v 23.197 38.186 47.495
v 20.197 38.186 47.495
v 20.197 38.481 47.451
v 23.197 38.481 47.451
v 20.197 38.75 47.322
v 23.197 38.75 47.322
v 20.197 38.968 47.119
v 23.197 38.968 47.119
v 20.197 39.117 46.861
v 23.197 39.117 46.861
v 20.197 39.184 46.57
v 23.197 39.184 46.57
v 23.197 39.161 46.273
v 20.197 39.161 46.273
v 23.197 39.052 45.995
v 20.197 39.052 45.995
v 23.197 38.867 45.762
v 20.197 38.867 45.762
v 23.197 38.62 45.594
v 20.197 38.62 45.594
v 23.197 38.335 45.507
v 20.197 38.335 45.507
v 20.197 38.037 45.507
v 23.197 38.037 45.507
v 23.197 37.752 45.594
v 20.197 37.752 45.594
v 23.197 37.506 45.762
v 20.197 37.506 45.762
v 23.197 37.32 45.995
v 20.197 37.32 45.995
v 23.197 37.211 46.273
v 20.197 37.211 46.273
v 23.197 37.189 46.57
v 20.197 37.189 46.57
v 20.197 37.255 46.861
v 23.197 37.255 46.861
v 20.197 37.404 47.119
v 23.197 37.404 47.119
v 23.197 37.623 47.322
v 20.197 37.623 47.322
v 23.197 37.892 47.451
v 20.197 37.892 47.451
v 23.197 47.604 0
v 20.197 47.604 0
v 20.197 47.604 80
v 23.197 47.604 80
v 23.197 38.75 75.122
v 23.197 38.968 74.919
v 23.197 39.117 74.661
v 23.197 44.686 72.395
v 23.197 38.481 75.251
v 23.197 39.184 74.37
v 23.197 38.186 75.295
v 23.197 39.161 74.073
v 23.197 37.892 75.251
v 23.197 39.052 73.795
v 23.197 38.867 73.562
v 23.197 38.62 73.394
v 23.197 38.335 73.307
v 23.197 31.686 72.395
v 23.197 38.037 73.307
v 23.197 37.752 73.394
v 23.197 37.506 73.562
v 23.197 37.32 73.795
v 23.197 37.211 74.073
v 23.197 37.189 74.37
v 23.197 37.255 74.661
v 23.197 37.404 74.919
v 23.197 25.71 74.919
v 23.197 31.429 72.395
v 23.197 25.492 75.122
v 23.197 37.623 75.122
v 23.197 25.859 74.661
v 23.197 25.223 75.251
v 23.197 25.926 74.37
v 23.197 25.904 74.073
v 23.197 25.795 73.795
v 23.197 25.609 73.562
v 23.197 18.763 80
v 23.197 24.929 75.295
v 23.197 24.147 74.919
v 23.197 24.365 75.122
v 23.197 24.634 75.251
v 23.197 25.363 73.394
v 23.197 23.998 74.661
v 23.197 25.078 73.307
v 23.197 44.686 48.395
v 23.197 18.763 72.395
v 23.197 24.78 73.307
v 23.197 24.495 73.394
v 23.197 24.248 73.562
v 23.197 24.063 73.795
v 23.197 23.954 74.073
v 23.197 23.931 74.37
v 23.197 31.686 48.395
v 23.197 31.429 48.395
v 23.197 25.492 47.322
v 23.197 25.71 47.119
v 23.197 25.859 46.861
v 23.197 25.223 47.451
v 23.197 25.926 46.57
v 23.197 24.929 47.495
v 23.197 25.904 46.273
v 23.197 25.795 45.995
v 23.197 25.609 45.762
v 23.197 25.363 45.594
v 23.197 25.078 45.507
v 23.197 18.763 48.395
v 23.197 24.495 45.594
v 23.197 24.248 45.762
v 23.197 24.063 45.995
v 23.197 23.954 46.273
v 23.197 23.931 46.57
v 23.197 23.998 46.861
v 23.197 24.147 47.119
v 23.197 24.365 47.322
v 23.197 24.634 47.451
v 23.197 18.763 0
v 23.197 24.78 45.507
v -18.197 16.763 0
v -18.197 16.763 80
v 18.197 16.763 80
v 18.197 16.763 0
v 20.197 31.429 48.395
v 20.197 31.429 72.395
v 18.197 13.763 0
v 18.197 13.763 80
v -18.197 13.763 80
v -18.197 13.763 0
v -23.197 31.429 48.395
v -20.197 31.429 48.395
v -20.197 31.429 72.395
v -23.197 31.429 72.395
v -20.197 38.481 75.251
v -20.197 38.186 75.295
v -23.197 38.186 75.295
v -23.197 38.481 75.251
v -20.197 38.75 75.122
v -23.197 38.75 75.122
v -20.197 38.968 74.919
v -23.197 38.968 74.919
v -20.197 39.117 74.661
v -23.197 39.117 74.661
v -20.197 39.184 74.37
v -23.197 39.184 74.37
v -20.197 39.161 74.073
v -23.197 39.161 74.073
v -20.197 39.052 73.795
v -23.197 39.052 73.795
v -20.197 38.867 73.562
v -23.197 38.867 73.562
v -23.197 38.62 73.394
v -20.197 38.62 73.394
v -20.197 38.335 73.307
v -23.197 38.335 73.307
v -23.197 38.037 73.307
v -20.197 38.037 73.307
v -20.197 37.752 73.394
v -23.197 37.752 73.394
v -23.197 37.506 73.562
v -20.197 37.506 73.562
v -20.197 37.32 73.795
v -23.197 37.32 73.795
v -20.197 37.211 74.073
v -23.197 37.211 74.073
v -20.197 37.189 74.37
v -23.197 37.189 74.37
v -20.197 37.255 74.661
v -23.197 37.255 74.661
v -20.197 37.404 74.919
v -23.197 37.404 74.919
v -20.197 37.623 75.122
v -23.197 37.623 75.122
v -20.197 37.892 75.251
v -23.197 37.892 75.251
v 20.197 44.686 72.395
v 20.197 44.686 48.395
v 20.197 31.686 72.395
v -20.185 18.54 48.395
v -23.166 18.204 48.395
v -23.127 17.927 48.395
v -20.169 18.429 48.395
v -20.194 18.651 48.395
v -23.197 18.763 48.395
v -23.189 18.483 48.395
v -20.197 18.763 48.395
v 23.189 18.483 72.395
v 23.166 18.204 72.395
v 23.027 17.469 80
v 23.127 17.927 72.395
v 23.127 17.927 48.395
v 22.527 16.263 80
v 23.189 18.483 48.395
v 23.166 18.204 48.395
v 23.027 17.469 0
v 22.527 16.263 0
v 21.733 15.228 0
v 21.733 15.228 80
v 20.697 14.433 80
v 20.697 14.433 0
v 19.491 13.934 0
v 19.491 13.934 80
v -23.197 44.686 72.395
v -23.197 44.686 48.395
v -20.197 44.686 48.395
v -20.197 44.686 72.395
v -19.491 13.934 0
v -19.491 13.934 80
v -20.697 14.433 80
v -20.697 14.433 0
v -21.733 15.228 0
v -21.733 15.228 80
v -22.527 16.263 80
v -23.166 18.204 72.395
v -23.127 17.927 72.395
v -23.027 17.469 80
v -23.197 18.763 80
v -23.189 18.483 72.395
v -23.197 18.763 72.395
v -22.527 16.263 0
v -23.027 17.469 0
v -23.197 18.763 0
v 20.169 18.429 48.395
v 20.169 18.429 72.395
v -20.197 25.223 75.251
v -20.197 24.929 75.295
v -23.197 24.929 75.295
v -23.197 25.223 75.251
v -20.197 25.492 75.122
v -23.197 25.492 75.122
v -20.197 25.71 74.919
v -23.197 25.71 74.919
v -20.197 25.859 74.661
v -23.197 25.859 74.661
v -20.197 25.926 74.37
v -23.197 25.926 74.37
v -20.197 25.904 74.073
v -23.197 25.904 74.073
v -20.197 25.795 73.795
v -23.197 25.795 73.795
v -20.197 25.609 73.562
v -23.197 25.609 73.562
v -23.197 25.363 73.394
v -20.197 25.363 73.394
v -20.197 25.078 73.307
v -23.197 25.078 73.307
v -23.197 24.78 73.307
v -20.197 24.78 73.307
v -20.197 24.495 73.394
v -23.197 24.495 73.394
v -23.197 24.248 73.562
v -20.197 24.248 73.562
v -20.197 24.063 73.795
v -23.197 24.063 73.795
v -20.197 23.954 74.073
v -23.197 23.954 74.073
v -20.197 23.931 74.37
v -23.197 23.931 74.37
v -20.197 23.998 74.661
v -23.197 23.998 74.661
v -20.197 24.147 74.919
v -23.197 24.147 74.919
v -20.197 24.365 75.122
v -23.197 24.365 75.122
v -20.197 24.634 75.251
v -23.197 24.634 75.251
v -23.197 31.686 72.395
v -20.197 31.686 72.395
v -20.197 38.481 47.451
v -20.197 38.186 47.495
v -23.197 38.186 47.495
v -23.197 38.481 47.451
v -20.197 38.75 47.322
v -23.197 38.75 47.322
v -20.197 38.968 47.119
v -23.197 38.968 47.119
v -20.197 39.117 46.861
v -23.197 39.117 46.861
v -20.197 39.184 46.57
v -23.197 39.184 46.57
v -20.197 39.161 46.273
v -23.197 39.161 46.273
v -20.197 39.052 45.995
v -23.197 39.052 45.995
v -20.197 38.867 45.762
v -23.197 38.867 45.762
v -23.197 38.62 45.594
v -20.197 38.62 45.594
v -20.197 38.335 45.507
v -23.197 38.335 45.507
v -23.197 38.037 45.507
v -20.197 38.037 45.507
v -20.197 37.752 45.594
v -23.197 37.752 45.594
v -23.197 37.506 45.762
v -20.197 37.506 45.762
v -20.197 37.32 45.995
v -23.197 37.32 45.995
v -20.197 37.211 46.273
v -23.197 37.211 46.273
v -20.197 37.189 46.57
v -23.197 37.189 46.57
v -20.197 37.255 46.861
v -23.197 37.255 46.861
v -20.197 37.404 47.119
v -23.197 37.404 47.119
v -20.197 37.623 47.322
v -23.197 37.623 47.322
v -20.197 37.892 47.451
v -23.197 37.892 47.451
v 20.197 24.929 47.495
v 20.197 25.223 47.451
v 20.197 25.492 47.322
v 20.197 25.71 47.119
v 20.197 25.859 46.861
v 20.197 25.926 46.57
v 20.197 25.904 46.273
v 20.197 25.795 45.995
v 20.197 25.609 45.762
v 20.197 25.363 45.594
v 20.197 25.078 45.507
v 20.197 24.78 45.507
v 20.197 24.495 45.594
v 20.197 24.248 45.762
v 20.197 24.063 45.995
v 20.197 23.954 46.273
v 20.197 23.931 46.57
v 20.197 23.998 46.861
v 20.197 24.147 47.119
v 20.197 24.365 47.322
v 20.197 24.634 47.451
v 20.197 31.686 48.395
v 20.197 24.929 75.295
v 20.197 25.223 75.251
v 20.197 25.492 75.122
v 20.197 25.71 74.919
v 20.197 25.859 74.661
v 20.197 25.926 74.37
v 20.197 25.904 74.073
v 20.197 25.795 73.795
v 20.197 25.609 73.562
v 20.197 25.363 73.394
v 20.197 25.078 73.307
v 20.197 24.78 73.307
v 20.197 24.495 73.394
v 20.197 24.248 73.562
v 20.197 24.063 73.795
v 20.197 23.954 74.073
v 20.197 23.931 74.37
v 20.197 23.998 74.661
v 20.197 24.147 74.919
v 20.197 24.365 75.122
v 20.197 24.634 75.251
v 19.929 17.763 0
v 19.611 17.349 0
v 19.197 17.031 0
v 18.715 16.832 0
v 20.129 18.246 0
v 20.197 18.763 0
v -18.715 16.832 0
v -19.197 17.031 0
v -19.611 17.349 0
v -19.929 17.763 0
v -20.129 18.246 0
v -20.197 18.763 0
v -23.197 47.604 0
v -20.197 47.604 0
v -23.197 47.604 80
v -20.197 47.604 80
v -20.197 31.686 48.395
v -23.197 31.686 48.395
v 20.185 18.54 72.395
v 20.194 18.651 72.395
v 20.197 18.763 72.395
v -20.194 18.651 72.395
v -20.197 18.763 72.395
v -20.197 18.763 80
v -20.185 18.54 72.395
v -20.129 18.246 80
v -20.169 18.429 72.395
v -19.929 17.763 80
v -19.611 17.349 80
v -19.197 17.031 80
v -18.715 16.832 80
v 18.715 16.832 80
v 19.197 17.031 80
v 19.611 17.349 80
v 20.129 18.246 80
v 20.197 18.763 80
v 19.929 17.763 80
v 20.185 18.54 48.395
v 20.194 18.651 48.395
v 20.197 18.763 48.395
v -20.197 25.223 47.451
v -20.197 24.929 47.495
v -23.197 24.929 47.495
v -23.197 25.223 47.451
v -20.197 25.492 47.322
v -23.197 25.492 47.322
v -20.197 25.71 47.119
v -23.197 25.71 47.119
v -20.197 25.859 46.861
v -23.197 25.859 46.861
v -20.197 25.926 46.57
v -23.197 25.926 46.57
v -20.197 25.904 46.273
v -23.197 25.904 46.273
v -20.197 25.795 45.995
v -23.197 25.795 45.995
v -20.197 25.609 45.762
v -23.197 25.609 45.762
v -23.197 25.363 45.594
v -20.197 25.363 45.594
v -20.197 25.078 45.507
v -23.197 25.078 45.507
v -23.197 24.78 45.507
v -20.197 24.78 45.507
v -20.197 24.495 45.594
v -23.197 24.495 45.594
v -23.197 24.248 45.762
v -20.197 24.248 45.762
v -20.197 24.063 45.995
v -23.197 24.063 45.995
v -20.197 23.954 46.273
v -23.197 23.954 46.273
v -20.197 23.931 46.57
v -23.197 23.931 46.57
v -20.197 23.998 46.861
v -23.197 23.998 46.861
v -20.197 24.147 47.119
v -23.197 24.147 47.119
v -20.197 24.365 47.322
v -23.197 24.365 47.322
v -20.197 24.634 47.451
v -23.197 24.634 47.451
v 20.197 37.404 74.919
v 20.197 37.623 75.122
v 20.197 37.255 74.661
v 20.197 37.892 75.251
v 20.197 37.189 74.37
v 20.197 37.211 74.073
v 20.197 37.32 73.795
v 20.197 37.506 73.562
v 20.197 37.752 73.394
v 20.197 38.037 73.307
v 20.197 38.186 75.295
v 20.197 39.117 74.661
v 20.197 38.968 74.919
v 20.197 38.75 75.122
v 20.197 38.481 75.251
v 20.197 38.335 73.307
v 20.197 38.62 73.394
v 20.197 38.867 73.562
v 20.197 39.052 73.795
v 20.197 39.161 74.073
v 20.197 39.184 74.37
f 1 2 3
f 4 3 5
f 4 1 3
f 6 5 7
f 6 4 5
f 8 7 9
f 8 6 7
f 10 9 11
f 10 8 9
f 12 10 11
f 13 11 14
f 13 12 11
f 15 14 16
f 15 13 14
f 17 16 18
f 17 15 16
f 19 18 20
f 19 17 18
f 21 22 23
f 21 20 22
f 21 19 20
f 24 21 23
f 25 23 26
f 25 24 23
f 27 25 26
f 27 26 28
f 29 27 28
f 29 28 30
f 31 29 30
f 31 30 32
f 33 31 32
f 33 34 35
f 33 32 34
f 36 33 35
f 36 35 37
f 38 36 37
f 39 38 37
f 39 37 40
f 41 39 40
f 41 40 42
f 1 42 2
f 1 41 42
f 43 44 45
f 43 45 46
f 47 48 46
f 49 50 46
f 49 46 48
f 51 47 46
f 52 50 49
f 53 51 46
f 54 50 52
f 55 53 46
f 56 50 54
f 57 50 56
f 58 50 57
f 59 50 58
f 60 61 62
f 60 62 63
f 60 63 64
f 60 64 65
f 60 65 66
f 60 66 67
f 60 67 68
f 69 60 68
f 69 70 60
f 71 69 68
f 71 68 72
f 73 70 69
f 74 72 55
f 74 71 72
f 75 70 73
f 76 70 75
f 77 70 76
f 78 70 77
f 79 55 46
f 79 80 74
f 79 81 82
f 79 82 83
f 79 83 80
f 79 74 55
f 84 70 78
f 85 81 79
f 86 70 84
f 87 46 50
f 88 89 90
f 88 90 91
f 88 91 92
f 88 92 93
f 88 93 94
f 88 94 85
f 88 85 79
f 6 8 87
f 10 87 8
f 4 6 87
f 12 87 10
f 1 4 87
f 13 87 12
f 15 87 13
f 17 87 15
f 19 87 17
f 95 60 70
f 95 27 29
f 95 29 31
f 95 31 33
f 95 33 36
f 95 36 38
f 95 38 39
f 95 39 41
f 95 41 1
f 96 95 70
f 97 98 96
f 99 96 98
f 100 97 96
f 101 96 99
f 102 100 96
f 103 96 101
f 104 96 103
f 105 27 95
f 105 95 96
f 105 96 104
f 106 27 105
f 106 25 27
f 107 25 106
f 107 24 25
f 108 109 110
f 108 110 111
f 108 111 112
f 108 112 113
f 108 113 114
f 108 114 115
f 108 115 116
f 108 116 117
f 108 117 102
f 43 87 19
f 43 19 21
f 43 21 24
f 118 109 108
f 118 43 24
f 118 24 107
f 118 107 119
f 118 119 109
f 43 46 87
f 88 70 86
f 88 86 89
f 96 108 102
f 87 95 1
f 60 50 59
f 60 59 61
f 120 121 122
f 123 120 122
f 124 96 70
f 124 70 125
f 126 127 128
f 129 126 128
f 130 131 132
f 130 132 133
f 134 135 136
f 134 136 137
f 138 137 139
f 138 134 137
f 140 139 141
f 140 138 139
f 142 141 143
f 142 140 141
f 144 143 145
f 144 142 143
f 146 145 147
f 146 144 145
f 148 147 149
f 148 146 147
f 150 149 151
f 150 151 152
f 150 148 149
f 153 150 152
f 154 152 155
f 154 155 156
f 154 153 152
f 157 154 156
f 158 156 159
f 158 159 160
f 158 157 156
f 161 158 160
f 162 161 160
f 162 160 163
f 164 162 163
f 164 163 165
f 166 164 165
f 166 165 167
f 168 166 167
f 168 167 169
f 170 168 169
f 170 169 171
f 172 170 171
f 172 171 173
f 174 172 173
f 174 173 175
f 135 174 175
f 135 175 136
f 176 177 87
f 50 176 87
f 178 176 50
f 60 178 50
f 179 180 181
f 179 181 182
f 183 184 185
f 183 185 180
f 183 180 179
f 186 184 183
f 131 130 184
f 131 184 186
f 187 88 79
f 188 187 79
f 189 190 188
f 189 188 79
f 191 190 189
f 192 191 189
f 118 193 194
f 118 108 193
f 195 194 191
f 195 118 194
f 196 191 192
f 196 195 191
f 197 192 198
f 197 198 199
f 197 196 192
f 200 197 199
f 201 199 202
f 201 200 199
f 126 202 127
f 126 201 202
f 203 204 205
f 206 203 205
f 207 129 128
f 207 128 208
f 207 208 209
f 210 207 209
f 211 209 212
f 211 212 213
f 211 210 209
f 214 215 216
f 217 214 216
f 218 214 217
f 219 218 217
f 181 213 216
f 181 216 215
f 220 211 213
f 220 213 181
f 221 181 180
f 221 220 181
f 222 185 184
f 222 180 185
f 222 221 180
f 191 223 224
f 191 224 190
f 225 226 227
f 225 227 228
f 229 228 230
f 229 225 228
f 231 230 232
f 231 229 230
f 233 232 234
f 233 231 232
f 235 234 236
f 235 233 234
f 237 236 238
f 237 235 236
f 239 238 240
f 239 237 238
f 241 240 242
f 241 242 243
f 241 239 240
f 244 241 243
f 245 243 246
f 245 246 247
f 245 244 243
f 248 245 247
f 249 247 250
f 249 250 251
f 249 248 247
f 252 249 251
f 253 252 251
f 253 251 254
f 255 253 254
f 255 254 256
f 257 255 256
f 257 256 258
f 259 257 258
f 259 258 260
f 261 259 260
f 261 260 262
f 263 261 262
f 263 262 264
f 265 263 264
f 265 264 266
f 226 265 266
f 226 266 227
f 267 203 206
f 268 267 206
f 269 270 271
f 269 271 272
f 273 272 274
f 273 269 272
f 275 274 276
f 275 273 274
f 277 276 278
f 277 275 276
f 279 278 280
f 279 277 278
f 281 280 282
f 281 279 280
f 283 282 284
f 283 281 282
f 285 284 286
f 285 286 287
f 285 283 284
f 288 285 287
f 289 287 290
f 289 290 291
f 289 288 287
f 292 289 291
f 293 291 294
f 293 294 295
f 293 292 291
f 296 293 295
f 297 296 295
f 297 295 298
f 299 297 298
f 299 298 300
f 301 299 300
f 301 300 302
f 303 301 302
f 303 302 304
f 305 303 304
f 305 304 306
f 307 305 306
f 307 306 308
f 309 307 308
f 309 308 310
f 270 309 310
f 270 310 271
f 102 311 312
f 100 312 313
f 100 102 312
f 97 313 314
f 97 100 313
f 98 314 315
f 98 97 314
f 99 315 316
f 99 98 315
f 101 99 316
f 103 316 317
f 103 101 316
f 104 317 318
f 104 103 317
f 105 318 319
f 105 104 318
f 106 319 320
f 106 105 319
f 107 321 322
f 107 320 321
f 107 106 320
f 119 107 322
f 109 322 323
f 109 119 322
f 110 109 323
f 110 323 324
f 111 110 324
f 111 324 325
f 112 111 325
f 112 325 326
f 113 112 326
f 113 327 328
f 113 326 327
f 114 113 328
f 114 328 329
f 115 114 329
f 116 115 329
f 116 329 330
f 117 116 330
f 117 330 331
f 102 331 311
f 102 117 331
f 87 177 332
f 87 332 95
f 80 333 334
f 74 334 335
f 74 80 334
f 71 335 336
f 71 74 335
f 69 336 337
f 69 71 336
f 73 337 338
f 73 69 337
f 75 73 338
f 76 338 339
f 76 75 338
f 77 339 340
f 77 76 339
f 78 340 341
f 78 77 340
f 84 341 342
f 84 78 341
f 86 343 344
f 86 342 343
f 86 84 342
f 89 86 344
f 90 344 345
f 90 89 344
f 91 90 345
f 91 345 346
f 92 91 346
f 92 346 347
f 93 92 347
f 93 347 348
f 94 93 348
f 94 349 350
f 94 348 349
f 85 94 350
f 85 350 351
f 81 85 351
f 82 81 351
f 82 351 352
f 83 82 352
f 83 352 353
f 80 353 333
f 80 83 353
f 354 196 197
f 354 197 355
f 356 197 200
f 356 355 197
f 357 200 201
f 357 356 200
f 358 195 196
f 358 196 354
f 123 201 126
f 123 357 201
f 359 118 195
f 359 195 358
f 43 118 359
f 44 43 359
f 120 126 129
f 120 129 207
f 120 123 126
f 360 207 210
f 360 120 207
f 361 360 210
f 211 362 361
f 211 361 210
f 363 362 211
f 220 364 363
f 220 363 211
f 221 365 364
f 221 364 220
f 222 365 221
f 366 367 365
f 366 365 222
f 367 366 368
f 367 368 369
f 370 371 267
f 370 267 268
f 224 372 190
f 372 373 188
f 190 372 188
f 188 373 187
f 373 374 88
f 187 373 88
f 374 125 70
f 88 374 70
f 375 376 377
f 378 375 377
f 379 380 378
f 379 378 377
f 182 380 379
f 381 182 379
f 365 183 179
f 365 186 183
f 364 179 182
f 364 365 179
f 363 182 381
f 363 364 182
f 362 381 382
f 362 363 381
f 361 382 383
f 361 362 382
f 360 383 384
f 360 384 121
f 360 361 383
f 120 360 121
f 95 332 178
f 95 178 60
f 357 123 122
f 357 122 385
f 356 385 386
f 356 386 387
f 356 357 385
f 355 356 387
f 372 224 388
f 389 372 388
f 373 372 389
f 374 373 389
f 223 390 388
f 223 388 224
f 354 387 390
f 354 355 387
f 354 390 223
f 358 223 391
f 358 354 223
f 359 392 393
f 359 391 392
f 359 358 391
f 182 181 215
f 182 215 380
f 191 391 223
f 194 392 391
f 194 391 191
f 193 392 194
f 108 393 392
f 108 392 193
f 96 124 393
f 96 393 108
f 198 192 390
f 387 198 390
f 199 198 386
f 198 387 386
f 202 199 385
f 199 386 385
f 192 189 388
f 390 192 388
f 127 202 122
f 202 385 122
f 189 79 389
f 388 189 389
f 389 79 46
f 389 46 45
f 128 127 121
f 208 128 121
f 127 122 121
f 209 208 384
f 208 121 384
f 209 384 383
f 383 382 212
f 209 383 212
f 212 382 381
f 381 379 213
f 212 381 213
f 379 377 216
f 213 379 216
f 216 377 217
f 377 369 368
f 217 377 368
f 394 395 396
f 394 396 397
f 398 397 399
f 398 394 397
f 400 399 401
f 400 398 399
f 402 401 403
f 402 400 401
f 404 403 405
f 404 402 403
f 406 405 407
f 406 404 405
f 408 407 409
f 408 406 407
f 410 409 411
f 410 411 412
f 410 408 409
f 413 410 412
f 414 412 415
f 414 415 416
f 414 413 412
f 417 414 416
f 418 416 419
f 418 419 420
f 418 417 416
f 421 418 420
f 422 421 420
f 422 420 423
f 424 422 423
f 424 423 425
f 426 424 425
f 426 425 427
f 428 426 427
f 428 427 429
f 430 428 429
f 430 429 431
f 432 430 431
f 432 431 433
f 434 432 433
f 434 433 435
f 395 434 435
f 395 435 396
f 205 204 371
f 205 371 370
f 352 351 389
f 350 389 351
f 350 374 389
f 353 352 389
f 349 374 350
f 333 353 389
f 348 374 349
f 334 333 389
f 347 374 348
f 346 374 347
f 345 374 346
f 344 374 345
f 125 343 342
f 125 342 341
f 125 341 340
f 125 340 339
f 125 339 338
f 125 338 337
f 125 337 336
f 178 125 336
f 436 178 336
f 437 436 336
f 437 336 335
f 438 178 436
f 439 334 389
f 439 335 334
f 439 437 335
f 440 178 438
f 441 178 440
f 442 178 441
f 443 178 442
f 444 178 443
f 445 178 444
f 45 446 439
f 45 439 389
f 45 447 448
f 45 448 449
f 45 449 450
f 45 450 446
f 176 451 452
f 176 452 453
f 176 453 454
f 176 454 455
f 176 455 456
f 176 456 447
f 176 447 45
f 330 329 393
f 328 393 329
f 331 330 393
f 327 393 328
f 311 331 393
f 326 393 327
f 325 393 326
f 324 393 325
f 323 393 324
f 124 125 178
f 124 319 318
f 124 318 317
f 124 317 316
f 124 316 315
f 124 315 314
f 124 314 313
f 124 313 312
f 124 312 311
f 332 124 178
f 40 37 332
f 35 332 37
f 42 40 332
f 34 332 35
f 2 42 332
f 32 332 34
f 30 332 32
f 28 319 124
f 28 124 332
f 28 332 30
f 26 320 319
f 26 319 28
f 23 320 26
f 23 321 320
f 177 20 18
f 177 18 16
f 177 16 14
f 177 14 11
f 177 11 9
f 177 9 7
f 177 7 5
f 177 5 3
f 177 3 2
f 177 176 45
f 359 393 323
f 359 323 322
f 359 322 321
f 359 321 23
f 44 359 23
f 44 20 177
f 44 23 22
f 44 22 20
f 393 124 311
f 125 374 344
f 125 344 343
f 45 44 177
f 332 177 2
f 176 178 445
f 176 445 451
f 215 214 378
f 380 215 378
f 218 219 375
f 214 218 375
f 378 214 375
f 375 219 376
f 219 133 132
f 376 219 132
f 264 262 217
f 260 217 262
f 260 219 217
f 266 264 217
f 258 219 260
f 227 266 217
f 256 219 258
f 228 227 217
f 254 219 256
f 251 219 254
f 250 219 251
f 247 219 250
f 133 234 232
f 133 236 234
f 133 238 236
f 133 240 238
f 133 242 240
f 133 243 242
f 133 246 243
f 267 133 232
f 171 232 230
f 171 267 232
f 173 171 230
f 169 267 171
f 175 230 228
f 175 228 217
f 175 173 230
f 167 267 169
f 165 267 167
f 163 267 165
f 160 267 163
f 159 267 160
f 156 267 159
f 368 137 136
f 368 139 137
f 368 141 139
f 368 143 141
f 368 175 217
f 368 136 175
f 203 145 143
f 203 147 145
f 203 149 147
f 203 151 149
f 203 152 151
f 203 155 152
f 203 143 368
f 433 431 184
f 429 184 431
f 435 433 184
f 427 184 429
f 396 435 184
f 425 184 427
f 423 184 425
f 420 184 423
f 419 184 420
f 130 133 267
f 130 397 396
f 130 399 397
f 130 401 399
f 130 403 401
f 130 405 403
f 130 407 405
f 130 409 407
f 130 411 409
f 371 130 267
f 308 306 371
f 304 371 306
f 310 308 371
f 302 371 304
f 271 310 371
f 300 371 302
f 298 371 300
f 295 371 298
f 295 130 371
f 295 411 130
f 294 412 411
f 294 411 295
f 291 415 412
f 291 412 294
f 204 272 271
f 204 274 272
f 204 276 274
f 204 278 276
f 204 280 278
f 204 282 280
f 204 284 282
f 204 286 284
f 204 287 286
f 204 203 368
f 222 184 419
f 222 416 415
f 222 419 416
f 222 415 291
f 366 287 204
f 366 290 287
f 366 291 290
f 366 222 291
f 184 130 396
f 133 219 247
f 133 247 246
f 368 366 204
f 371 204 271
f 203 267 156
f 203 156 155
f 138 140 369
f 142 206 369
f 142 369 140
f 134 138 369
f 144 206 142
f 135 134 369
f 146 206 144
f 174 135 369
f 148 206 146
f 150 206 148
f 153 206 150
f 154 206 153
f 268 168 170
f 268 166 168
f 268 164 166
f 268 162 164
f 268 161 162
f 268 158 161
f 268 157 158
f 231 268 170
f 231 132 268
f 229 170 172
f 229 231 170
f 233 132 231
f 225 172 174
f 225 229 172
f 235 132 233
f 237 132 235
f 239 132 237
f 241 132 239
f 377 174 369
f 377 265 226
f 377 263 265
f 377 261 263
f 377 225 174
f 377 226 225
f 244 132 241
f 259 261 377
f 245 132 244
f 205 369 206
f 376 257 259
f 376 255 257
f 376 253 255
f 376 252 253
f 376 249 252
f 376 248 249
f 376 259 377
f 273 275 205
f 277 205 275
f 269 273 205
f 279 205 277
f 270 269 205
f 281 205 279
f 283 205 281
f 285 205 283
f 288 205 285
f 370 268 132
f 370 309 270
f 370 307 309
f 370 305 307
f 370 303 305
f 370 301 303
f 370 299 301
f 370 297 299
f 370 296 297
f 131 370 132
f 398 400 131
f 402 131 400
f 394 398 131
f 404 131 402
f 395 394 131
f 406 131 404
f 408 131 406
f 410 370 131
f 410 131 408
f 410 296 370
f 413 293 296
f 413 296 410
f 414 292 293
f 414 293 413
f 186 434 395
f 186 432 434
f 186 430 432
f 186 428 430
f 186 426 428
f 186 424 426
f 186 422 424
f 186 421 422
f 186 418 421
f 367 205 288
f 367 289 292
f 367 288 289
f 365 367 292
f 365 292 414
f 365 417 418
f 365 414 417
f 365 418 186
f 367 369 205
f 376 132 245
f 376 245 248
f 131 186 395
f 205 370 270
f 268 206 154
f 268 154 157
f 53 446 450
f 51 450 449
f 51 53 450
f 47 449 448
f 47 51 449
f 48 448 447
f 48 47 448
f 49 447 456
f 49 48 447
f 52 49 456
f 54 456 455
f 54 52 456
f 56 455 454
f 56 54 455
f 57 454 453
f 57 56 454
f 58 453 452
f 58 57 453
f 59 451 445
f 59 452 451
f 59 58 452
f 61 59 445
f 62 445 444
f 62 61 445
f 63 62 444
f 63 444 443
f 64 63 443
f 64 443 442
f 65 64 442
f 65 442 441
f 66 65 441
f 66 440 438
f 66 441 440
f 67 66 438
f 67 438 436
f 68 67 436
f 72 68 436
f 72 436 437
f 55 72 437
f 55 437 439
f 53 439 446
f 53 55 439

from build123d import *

# Parameters (mm, degrees)
BASE_FLANGE1_DEPTH       = 80
CUT_EXTRUDE1_START       = 48.39544582
CUT_EXTRUDE1_OUTLINE_W   = 3
CUT_EXTRUDE1_OUTLINE_H   = 13
CUT_EXTRUDE1_DEPTH       = 24
CUT_EXTRUDE1_START_2     = -46.394569282
CUT_EXTRUDE1_2_OUTLINE_R = 1
CUT_EXTRUDE1_2_DEPTH     = 46.394569282


# Read off the part's stored shape, not the designer's step: Cut-Extrude1
# Sheet-metal steps are written as plain solids
with BuildPart() as part:
    # Sketch1 → Base-Flange1 (new body)
    with BuildSketch(Plane.XY):
        with BuildLine():
            Line((23.197284641, 47.603861413), (23.197284641, 18.763363208))
            ThreePointArc((23.197284641, 18.763363208), (21.732818547, 15.227829302), (18.197284641, 13.763363208))
            Line((18.197284641, 13.763363208), (-18.197284641, 13.763363208))
            ThreePointArc((-18.197284641, 13.763363208), (-21.732818547, 15.227829302), (-23.197284641, 18.763363208))
            Line((-23.197284641, 18.763363208), (-23.197284641, 47.603861413))
            Line((-23.197284641, 47.603861413), (-20.197284641, 47.603861413))
            Line((-20.197284641, 47.603861413), (-20.197284641, 18.763363208))
            ThreePointArc((-20.197284641, 18.763363208), (-19.611498203, 17.349149646), (-18.197284641, 16.763363208))
            Line((-18.197284641, 16.763363208), (18.197284641, 16.763363208))
            ThreePointArc((18.197284641, 16.763363208), (19.611498203, 17.349149646), (20.197284641, 18.763363208))
            Line((20.197284641, 18.763363208), (20.197284641, 47.603861413))
            Line((20.197284641, 47.603861413), (23.197284641, 47.603861413))
        make_face()
    extrude(amount=BASE_FLANGE1_DEPTH)

    # Cut-Extrude1 outline → Cut-Extrude1 (cut)
    with BuildSketch(Plane.XY.offset(CUT_EXTRUDE1_START)):
        with BuildLine():
            Line((-20.197284641, 18.763363208), (-20.197284641, 31.428624583))
            Line((-20.197284641, 31.428624583), (-23.197284641, 31.428624583))
            Line((-23.197284641, 31.428624583), (-23.197284641, 18.763363208))
            ThreePointArc((-23.197284641, 18.763363208), (-23.17962128, 18.343456534), (-23.126755995, 17.926516645))
            Line((-23.126755995, 17.926516645), (-20.169073182, 18.428624583))
            ThreePointArc((-20.169073182, 18.428624583), (-20.190219297, 18.595400538), (-20.197284641, 18.763363208))
        make_face()
        with Locations((-21.697284641, 38.186330489)):
            Rectangle(CUT_EXTRUDE1_OUTLINE_W, CUT_EXTRUDE1_OUTLINE_H)
        with BuildLine():
            Line((23.197284641, 18.763363208), (23.197284641, 31.428624583))
            Line((23.197284641, 31.428624583), (20.197284641, 31.428624583))
            Line((20.197284641, 31.428624583), (20.197284641, 18.763363208))
            ThreePointArc((20.197284641, 18.763363208), (20.190219297, 18.595400538), (20.169073182, 18.428624583))
            Line((20.169073182, 18.428624583), (23.126755995, 17.926516645))
            ThreePointArc((23.126755995, 17.926516645), (23.17962128, 18.343456534), (23.197284641, 18.763363208))
        make_face()
        with Locations((21.697284641, 38.186330489)):
            Rectangle(CUT_EXTRUDE1_OUTLINE_W, CUT_EXTRUDE1_OUTLINE_H)
    extrude(amount=CUT_EXTRUDE1_DEPTH, mode=Mode.SUBTRACT)

    # Cut-Extrude1 2 outline → Cut-Extrude1 2 (cut)
    with BuildSketch(Plane.ZY.offset(23.197284641).offset(CUT_EXTRUDE1_START_2)):
        with Locations((74.29544582, 24.928624583)):
            Circle(CUT_EXTRUDE1_2_OUTLINE_R)
        with Locations((46.49544582, 24.928624583)):
            Circle(CUT_EXTRUDE1_2_OUTLINE_R)
        with Locations((74.29544582, 38.186330489)):
            Circle(CUT_EXTRUDE1_2_OUTLINE_R)
        with Locations((46.49544582, 38.186330489)):
            Circle(CUT_EXTRUDE1_2_OUTLINE_R)
    extrude(amount=CUT_EXTRUDE1_2_DEPTH, mode=Mode.SUBTRACT)


solid = part.part
